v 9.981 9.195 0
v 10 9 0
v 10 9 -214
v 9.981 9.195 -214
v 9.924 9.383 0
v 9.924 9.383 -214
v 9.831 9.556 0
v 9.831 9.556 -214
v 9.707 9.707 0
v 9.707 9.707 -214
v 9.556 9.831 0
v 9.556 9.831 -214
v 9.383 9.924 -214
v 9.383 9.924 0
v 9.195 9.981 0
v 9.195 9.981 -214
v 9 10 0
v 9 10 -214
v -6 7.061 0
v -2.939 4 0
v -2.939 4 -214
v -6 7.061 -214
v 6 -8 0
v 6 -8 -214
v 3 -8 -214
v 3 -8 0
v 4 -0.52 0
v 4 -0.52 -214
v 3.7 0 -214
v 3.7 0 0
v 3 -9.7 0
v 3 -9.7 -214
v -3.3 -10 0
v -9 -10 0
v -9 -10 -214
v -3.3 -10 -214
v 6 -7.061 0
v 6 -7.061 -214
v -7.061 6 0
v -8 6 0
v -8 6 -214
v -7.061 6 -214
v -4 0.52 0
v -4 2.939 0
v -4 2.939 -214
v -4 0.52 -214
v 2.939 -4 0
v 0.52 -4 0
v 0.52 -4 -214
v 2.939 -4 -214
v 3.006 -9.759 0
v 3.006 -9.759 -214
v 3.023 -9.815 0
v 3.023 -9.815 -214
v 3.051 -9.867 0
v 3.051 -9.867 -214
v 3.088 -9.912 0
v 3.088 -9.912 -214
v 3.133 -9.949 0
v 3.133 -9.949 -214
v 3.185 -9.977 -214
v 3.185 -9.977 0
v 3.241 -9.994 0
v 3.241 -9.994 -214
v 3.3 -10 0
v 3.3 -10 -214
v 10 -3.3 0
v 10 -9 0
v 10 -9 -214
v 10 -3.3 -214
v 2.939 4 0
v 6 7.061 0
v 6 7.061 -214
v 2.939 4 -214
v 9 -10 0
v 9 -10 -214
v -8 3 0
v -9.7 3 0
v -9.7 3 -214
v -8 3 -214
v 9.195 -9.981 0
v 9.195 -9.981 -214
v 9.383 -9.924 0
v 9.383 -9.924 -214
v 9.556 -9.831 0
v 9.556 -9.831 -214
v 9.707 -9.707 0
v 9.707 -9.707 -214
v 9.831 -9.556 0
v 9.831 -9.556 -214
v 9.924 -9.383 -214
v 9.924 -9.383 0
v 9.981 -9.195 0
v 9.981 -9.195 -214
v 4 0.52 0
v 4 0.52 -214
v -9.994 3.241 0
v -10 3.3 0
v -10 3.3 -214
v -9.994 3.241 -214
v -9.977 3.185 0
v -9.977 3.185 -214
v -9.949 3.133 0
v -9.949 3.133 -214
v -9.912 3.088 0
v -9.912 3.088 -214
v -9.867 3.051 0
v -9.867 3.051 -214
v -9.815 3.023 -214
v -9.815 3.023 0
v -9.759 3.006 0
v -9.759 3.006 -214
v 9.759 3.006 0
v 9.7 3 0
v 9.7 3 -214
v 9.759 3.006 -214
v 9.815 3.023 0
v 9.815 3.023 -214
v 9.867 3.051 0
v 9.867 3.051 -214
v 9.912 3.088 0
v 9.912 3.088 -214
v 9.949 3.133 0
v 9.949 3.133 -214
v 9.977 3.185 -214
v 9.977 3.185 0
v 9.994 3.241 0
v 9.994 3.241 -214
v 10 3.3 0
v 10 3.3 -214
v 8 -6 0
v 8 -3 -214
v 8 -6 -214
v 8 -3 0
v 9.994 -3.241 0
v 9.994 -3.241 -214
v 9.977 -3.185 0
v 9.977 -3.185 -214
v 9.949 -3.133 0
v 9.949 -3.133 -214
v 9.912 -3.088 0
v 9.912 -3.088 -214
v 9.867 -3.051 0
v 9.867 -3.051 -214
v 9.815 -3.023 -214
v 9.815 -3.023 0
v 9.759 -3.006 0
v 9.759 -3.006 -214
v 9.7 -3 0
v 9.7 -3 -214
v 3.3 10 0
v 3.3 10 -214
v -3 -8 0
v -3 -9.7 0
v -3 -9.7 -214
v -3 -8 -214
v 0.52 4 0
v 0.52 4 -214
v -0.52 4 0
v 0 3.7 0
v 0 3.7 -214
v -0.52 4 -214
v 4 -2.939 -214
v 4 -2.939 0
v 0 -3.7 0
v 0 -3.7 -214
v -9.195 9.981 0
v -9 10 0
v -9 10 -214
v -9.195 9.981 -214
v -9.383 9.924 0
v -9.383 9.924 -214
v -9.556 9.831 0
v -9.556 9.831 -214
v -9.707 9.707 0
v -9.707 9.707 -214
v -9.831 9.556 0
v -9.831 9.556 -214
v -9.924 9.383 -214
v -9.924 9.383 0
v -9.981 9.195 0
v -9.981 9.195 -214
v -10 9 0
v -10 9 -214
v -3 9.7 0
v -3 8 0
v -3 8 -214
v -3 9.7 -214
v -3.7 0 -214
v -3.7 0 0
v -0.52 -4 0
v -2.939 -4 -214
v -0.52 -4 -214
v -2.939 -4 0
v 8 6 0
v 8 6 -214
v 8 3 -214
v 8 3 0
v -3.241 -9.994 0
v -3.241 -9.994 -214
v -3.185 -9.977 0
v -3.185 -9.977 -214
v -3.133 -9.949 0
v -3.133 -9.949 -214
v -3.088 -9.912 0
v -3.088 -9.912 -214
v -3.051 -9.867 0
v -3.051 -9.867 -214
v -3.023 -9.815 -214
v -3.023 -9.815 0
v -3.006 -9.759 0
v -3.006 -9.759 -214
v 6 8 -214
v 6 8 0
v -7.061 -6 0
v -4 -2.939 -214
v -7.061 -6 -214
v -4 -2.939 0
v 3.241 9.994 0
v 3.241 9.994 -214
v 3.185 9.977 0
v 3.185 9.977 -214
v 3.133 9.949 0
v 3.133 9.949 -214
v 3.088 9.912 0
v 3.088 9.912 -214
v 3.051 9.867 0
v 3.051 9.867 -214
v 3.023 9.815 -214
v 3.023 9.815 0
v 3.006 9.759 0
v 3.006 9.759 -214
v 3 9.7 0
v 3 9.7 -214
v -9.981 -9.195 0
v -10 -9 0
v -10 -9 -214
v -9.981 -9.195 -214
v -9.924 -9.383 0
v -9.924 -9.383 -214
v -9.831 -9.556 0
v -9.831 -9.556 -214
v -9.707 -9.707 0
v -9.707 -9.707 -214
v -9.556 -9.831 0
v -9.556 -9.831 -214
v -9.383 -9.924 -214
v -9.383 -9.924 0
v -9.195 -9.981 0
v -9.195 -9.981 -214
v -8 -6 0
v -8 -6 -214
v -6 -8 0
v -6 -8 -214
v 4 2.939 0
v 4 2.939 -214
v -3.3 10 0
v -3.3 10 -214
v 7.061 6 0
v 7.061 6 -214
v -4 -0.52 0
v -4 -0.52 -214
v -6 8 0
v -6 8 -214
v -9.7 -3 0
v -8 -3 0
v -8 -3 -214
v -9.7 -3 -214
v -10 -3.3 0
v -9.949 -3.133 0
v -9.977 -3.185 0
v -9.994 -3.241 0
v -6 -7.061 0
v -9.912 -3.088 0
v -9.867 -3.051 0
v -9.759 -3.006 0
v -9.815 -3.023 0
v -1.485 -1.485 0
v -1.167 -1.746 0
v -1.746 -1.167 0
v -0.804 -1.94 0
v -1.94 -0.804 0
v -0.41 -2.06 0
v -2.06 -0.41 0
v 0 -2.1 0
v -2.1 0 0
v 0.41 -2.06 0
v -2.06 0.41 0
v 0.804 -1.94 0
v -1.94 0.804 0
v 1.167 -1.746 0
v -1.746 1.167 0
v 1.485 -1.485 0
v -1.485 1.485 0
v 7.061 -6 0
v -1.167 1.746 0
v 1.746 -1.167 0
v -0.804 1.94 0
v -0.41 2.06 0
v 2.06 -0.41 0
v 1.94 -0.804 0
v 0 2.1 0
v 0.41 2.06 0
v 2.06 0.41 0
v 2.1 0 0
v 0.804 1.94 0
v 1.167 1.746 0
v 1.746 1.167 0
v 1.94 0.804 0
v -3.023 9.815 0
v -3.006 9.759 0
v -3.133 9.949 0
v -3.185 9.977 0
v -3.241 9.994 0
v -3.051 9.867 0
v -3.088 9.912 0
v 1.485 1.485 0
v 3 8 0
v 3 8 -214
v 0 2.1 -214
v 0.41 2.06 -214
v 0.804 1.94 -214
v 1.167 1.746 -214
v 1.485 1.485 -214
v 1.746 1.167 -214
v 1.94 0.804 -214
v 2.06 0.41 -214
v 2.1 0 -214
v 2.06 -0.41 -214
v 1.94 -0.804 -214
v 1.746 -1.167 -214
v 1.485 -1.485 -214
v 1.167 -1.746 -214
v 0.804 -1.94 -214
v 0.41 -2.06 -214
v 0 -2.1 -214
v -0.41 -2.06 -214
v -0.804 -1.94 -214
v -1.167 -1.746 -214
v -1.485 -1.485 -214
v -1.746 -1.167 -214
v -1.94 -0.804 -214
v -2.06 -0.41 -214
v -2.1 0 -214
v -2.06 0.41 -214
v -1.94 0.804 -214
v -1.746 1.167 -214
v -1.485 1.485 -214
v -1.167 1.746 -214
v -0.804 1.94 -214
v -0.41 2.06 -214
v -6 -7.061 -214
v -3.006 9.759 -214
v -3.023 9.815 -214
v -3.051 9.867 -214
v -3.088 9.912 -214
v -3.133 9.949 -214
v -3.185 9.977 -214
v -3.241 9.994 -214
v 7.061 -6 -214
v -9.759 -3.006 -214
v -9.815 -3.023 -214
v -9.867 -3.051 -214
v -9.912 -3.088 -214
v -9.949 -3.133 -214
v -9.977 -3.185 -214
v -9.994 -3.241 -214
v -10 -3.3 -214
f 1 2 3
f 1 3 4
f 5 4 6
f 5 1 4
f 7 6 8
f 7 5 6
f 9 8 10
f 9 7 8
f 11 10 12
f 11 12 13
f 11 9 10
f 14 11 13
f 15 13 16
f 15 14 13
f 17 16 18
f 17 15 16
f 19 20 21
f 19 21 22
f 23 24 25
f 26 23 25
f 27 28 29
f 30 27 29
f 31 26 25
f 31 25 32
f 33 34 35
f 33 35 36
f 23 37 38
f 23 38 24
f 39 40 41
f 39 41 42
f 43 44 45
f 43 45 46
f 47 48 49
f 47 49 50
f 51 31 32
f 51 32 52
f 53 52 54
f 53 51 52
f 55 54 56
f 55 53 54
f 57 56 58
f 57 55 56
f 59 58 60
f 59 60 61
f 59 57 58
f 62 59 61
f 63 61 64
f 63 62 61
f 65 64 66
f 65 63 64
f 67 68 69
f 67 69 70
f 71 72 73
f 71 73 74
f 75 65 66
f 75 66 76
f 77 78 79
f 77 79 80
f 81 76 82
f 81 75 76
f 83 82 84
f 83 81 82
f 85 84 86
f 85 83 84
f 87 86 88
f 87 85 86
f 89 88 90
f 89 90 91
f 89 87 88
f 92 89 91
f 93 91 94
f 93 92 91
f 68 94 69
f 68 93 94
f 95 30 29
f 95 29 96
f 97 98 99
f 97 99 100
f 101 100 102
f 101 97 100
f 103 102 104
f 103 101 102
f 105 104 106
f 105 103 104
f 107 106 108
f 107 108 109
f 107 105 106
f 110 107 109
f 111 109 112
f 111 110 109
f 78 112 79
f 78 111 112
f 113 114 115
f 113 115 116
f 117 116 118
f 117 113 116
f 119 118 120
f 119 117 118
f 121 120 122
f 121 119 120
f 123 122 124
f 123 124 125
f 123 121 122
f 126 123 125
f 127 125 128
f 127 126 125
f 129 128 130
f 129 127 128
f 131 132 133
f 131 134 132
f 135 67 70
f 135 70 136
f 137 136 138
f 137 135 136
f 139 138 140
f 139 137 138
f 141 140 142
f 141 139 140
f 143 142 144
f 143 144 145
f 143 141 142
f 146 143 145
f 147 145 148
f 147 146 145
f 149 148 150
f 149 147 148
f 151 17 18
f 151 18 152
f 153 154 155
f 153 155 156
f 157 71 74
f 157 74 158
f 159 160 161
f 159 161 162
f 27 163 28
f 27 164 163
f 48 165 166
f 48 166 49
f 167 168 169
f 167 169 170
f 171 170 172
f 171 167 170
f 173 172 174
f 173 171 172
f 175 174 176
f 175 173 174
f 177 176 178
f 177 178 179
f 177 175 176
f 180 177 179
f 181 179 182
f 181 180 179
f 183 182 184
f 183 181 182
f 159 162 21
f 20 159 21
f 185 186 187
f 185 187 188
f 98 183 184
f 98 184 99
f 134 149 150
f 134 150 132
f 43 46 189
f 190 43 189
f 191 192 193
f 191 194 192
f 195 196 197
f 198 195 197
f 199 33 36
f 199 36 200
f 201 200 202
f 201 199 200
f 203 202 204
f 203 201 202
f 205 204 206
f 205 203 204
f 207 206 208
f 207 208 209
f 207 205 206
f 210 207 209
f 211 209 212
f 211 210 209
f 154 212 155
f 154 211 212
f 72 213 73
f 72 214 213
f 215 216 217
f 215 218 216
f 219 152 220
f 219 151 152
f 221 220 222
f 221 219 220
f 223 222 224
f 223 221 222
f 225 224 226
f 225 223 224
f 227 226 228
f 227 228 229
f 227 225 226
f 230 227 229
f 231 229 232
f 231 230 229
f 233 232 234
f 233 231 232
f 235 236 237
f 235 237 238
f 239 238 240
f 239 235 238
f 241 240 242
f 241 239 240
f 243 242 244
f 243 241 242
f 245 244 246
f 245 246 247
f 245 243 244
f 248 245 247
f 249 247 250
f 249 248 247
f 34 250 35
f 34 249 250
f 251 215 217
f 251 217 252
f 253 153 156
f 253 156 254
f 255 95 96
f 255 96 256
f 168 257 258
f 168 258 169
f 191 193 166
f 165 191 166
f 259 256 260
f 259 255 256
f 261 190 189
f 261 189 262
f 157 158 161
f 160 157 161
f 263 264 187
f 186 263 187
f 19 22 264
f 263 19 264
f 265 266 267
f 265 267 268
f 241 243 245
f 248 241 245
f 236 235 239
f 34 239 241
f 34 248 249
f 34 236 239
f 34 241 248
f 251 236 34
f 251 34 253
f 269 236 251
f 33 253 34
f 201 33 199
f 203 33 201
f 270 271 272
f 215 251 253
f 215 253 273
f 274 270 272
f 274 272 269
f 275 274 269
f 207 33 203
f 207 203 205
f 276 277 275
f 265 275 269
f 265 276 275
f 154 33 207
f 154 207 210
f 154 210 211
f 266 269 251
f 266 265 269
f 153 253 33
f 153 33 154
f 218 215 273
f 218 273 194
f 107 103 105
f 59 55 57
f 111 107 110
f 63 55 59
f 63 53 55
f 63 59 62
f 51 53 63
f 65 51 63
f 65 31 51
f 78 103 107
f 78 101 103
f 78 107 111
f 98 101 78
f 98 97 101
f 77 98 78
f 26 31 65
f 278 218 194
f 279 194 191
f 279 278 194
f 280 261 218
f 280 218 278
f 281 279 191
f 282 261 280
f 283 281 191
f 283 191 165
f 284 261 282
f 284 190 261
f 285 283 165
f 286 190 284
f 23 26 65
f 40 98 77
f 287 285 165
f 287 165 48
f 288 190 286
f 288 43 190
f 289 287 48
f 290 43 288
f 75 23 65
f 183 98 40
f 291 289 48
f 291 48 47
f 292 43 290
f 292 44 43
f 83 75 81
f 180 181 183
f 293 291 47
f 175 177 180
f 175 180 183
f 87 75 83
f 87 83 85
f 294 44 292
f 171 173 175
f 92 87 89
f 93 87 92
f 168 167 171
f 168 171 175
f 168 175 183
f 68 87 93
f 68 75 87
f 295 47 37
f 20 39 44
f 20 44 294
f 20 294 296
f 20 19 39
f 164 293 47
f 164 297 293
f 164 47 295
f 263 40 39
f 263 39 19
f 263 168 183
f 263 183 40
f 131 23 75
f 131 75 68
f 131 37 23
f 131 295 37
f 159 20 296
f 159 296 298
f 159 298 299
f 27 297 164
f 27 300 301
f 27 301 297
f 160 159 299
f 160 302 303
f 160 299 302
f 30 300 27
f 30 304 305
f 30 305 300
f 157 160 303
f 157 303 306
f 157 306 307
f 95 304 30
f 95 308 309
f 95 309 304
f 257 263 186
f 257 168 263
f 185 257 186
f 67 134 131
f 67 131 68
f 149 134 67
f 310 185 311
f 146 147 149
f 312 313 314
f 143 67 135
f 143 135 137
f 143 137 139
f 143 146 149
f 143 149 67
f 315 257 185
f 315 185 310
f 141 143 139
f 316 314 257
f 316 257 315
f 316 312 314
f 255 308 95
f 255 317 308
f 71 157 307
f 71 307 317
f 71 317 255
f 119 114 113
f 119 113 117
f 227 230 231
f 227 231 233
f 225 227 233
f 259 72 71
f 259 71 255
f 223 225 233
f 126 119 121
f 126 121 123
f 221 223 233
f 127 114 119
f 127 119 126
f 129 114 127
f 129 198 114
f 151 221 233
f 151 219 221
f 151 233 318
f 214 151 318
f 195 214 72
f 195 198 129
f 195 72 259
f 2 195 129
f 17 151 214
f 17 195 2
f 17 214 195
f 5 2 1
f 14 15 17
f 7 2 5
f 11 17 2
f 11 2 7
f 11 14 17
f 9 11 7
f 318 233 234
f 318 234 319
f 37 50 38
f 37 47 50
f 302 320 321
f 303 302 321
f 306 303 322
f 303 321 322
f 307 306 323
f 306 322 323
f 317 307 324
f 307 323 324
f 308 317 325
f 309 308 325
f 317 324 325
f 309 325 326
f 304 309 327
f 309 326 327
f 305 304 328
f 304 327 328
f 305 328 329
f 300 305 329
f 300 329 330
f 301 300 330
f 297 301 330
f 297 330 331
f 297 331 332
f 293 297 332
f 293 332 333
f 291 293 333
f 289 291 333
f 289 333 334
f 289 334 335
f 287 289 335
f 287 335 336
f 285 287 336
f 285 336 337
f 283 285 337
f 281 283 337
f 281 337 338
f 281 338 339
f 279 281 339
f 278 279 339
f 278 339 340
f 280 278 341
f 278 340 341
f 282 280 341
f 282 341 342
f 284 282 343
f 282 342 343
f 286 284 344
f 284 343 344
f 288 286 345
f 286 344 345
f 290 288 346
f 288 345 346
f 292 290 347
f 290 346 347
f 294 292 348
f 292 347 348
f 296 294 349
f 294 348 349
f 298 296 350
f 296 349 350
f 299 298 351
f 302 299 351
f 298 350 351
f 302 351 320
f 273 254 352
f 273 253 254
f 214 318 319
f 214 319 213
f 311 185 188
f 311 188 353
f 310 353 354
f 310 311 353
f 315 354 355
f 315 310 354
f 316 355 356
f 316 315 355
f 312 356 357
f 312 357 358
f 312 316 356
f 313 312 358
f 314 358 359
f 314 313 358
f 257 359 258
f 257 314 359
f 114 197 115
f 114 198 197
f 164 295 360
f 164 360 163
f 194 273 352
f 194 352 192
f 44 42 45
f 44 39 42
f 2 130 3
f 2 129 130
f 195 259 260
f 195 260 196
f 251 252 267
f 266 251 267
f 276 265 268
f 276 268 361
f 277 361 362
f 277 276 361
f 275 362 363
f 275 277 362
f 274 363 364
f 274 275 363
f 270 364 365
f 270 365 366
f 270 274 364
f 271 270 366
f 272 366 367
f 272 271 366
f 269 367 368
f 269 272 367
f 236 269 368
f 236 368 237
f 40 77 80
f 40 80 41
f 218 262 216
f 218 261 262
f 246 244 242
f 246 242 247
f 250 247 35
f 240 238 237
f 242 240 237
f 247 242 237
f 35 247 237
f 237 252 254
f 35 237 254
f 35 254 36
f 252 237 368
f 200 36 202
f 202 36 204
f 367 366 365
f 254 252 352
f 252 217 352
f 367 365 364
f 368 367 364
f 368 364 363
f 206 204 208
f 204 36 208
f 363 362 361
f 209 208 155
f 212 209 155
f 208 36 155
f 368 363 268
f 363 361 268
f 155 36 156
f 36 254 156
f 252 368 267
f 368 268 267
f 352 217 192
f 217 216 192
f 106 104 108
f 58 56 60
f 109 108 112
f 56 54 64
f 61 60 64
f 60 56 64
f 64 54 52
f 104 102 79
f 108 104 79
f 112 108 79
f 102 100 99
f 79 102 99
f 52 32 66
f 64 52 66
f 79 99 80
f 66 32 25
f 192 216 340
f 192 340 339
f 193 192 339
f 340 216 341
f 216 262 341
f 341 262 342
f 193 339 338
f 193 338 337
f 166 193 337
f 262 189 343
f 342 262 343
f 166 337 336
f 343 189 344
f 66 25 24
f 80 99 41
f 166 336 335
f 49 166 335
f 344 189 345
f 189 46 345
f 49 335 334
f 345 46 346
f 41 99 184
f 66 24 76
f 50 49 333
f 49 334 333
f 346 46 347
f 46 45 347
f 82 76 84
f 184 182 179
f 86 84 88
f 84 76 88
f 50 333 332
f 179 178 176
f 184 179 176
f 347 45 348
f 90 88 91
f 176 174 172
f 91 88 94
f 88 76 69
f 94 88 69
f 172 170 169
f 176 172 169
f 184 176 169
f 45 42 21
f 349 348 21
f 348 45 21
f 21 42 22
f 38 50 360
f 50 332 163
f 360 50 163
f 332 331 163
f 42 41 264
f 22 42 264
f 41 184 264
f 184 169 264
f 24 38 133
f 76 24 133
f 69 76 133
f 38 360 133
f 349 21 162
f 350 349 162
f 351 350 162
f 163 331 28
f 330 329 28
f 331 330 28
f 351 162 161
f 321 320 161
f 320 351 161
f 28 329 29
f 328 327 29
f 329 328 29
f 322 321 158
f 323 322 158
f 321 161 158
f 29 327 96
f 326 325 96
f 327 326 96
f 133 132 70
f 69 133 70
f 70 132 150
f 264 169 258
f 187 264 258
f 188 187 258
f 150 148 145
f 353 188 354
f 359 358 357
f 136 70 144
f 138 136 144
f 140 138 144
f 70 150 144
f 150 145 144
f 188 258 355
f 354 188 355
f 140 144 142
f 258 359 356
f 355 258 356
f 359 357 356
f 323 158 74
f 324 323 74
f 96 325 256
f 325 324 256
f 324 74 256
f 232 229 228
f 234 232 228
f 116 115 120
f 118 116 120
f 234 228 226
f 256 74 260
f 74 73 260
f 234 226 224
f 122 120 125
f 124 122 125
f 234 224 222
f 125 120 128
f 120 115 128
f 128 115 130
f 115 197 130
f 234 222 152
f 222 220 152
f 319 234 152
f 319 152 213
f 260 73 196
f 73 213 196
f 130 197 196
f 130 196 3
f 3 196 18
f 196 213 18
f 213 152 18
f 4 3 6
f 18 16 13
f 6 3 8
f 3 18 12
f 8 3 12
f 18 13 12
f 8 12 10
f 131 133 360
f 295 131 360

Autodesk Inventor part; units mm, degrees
sketch "Sketch_1" plane through (0, 0, 0) normal (0, 0, 1) x (1, 0, 0)
  line L0 (-10, 9) -> (-10, 3.3)
  arc A0 (-10, 3.3) -> (-9.7, 3) centre (-9.7, 3.3) ccw
  line L1 (-9.7, 3) -> (-8, 3)
  line L2 (-8, 3) -> (-8, 6)
  line L3 (-8, 6) -> (-7.0607, 6)
  line L4 (-7.0607, 6) -> (-4, 2.9393)
  line L5 (-4, 2.9393) -> (-4, 0.5196)
  line L6 (-4, 0.5196) -> (-3.7, 0)
  line L7 (-3.7, 0) -> (-4, -0.5196)
  line L8 (-4, -0.5196) -> (-4, -2.9393)
  line L9 (-4, -2.9393) -> (-7.0607, -6)
  line L10 (-7.0607, -6) -> (-8, -6)
  line L11 (-8, -6) -> (-8, -3)
  line L12 (-8, -3) -> (-9.7, -3)
  arc A1 (-9.7, -3) -> (-10, -3.3) centre (-9.7, -3.3) ccw
  line L13 (-10, -3.3) -> (-10, -9)
  arc A2 (-10, -9) -> (-9, -10) centre (-9, -9) ccw
  line L14 (-9, -10) -> (-3.3, -10)
  arc A3 (-3.3, -10) -> (-3, -9.7) centre (-3.3, -9.7) ccw
  line L15 (-3, -9.7) -> (-3, -8)
  line L16 (-3, -8) -> (-6, -8)
  line L17 (-6, -8) -> (-6, -7.0607)
  line L18 (-6, -7.0607) -> (-2.9393, -4)
  line L19 (-2.9393, -4) -> (-0.5196, -4)
  line L20 (-0.5196, -4) -> (0, -3.7)
  line L21 (0, -3.7) -> (0.5196, -4)
  line L22 (0.5196, -4) -> (2.9393, -4)
  line L23 (2.9393, -4) -> (6, -7.0607)
  line L24 (6, -7.0607) -> (6, -8)
  line L25 (6, -8) -> (3, -8)
  line L26 (3, -8) -> (3, -9.7)
  arc A4 (3, -9.7) -> (3.3, -10) centre (3.3, -9.7) ccw
  line L27 (3.3, -10) -> (9, -10)
  arc A5 (9, -10) -> (10, -9) centre (9, -9) ccw
  line L28 (10, -9) -> (10, -3.3)
  arc A6 (10, -3.3) -> (9.7, -3) centre (9.7, -3.3) ccw
  line L29 (9.7, -3) -> (8, -3)
  line L30 (8, -3) -> (8, -6)
  line L31 (8, -6) -> (7.0606, -6)
  line L32 (7.0606, -6) -> (4, -2.9393)
  line L33 (4, -2.9393) -> (4, -0.5196)
  line L34 (4, -0.5196) -> (3.7, 0)
  line L35 (3.7, 0) -> (4, 0.5196)
  line L36 (4, 0.5196) -> (4, 2.9393)
  line L37 (4, 2.9393) -> (7.0607, 6)
  line L38 (7.0607, 6) -> (8, 6)
  line L39 (8, 6) -> (8, 3)
  line L40 (8, 3) -> (9.7, 3)
  arc A7 (9.7, 3) -> (10, 3.3) centre (9.7, 3.3) ccw
  line L41 (10, 3.3) -> (10, 9)
  arc A8 (10, 9) -> (9, 10) centre (9, 9) ccw
  line L42 (9, 10) -> (3.3, 10)
  arc A9 (3.3, 10) -> (3, 9.7) centre (3.3, 9.7) ccw
  line L43 (3, 9.7) -> (3, 8)
  line L44 (3, 8) -> (6, 8)
  line L45 (6, 8) -> (6, 7.0607)
  line L46 (6, 7.0607) -> (2.9393, 4)
  line L47 (2.9393, 4) -> (0.5196, 4)
  line L48 (0.5196, 4) -> (0, 3.7)
  line L49 (0, 3.7) -> (-0.5196, 4)
  line L50 (-0.5196, 4) -> (-2.9394, 4)
  line L51 (-2.9394, 4) -> (-6, 7.0606)
  line L52 (-6, 7.0606) -> (-6, 8)
  line L53 (-6, 8) -> (-3, 8)
  line L54 (-3, 8) -> (-3, 9.7)
  arc A10 (-3, 9.7) -> (-3.3, 10) centre (-3.3, 9.7) ccw
  line L55 (-3.3, 10) -> (-9, 10)
  arc A11 (-9, 10) -> (-10, 9) centre (-9, 9) ccw
extrude "Extrusion1" add sketch "Sketch_1" against normal blind 214
sketch "Sketch_2" plane through (0, 0, 0) normal (1, 0, 0) x (0, 0, -1)
  line L0 (400, 0) -> (0, 0)
  line L1 (0, 0) -> (0, 2.1)
  line L2 (0, 2.1) -> (400, 2.1)
  line L3 (400, 2.1) -> (400, 0)
  line L4 (400, 0) -> (0, 0)
revolve "Revolution1" cut sketch "Sketch_2" angle 360 about axis through (0, 0, -400) along (0, 0, -1)
ref_plane "C1_XY" through (0, 0, 0) normal (0, 0, 1) x (1, 0, 0)
ref_plane "C1_YZ" through (0, 0, 0) normal (1, 0, 0) x (0, 1, 0)
ref_plane "C1_ZX" through (0, 0, 0) normal (0, 1, 0) x (0, 0, 1)
properties part number "2020 extrusion 250mm"
